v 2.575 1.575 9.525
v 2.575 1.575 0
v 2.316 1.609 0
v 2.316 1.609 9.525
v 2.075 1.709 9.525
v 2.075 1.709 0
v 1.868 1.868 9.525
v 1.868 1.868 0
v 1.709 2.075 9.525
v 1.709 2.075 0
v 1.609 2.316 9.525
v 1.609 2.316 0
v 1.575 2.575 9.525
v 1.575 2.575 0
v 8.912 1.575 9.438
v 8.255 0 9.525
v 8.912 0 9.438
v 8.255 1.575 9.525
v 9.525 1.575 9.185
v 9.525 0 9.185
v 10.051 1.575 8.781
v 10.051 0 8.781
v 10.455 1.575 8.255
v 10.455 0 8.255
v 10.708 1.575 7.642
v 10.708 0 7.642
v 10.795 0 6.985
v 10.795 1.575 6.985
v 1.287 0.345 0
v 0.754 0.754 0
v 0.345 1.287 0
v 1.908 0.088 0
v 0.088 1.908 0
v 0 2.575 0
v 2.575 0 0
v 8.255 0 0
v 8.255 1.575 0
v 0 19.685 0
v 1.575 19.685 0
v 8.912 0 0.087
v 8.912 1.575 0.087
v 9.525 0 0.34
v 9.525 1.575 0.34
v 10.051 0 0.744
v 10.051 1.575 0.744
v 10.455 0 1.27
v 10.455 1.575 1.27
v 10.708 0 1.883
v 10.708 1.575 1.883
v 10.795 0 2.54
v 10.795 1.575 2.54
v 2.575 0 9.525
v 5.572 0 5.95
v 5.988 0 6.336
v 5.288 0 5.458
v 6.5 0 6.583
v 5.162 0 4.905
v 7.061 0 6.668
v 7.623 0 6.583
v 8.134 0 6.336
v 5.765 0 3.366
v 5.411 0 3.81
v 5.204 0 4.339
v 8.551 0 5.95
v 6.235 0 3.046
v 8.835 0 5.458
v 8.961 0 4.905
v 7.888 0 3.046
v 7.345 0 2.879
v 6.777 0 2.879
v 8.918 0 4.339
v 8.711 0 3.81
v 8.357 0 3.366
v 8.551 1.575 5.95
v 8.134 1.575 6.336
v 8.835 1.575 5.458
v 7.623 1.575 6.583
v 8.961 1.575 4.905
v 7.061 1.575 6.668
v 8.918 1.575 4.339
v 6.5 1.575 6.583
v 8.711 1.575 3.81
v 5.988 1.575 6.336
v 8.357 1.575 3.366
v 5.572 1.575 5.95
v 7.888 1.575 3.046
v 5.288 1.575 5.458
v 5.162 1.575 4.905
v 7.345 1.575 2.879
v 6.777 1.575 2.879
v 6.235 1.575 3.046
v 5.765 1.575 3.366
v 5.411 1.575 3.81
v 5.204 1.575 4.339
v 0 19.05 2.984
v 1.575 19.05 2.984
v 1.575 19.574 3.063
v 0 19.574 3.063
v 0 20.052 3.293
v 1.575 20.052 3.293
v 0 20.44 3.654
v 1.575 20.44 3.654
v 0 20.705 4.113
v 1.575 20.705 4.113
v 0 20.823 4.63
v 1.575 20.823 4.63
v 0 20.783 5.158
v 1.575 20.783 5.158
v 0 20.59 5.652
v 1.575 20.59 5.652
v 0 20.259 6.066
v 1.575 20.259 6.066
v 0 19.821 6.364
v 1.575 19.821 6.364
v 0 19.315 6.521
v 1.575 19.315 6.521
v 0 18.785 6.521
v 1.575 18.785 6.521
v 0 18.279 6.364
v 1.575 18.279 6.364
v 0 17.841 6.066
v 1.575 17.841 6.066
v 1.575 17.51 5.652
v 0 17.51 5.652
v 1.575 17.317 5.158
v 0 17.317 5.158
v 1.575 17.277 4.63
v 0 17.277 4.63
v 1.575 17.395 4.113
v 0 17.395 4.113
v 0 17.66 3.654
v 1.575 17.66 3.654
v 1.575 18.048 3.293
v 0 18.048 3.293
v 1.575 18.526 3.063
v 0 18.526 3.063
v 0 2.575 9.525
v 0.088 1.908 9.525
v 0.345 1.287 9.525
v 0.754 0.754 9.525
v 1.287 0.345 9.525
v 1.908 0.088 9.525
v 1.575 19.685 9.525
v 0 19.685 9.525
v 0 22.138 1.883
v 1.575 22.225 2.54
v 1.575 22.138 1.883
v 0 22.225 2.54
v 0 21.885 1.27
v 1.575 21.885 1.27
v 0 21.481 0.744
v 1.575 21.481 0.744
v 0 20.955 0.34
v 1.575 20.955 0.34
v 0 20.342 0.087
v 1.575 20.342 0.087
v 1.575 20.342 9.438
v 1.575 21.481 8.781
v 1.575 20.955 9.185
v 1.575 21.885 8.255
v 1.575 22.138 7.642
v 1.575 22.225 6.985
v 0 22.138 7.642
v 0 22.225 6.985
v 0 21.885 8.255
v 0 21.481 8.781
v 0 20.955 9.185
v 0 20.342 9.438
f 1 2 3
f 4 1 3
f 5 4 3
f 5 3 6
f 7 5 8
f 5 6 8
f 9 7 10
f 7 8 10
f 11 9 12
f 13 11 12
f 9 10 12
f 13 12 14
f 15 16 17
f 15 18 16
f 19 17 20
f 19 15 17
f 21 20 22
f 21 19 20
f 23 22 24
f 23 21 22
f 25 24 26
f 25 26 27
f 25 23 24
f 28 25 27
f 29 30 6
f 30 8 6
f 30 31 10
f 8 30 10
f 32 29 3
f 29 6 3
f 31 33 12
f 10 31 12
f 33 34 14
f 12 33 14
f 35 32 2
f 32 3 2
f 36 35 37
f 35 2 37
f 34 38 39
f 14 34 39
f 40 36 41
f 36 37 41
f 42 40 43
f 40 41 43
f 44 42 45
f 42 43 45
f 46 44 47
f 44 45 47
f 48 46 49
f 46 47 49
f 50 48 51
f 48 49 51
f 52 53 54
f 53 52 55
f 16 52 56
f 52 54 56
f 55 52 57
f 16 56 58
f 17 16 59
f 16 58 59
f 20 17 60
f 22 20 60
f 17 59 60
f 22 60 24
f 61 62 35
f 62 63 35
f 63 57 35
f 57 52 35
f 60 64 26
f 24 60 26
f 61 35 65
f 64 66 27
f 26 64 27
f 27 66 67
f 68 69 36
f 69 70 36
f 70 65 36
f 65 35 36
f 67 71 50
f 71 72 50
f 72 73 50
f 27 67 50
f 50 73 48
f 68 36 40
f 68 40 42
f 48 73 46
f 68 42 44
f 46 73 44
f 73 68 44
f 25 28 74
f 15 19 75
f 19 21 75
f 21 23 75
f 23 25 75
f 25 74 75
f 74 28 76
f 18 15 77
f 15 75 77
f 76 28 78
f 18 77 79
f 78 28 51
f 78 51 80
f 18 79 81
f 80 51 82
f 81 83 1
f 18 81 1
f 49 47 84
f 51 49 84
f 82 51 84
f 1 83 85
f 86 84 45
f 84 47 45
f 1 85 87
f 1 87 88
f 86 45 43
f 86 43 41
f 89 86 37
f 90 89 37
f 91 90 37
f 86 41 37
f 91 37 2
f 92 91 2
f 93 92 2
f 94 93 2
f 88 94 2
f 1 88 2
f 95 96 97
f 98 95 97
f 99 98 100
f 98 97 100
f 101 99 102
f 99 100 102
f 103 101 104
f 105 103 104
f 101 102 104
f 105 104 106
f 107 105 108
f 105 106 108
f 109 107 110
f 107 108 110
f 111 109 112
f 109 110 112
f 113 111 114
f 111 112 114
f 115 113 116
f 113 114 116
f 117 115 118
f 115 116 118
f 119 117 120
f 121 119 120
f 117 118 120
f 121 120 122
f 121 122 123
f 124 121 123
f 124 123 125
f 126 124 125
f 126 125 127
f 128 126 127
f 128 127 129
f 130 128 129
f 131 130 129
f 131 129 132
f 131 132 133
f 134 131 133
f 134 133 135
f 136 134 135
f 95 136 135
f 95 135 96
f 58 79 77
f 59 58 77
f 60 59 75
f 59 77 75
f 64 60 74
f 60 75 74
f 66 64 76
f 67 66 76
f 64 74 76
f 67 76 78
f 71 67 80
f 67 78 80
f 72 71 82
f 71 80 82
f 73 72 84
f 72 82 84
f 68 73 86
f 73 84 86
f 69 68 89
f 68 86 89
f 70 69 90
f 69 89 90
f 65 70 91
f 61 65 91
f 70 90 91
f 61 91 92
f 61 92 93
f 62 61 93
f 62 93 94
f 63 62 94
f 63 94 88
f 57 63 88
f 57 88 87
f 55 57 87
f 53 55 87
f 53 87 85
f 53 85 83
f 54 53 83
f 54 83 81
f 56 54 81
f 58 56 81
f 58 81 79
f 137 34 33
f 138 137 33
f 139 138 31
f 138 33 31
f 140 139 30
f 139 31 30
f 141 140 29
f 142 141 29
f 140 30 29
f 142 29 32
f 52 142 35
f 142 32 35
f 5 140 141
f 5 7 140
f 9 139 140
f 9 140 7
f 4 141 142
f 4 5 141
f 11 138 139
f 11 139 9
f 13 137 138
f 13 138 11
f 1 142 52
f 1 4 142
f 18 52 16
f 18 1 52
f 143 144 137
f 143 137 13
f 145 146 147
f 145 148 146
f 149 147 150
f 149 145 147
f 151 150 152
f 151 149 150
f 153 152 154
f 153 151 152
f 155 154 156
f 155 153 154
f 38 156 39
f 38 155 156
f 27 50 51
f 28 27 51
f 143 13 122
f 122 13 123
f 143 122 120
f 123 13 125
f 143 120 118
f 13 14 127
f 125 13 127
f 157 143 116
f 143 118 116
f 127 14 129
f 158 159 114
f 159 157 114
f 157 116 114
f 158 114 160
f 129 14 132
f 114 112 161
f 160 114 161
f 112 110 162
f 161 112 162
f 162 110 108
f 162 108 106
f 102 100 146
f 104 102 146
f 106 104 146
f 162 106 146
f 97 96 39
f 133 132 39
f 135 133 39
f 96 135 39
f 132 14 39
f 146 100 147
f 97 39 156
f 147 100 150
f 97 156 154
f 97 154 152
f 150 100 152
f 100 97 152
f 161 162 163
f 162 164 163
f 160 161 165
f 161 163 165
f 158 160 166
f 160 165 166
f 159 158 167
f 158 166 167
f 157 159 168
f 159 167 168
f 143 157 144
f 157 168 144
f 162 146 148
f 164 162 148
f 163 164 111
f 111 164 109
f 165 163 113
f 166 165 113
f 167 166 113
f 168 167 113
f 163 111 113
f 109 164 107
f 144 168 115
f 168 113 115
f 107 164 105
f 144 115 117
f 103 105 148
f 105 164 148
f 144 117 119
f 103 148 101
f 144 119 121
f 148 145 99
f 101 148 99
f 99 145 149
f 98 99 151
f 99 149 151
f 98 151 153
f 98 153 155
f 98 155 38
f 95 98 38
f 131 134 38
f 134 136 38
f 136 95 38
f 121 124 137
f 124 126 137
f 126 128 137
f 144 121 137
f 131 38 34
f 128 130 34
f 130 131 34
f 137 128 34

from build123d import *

# Parameters (mm, degrees)
BASE_FLANGE1_DEPTH = 9.525
SKETCH6_R          = 1.905
CUT_EXTRUDE1_DEPTH = 26.173168455
SKETCH7_R          = 1.778
CUT_EXTRUDE2_DEPTH = 26.878337235
FILLET1_R          = 2.54


# Sheet-metal steps are written as plain solids
with BuildPart() as part:
    # Sketch2 → Base-Flange1 (new body)
    with BuildSketch(Plane.XY):
        with BuildLine():
            Line((0, 22.225), (0, 2.5748))
            ThreePointArc((0, 2.5748), (0.75414146, 0.75414146), (2.5748, 0))
            Line((2.5748, 0), (10.795, 0))
            Line((10.795, 0), (10.795, 1.5748))
            Line((10.795, 1.5748), (2.5748, 1.5748))
            ThreePointArc((2.5748, 1.5748), (1.867693219, 1.867693219), (1.5748, 2.5748))
            Line((1.5748, 2.5748), (1.5748, 22.225))
            Line((1.5748, 22.225), (0, 22.225))
        make_face()
    extrude(amount=BASE_FLANGE1_DEPTH)

    # Sketch6 → Cut-Extrude1 (cut, through all)
    with BuildSketch(Plane(origin=(0, 1.5748, 0), x_dir=(1, 0, 0), z_dir=(0, 1, 0))):
        with Locations(Location((7.0612, -4.7625, 0), (0, 0, 270))):
            Circle(SKETCH6_R)
    extrude(amount=-CUT_EXTRUDE1_DEPTH, mode=Mode.SUBTRACT)

    # Sketch7 → Cut-Extrude2 (cut, through all)
    with BuildSketch(Plane(origin=(1.5748, 0, 0), x_dir=(0, 0, -1), z_dir=(1, 0, 0))):
        with Locations((-4.7625, 19.05)):
            Circle(SKETCH7_R)
    extrude(amount=-CUT_EXTRUDE2_DEPTH, mode=Mode.SUBTRACT)

    # Fillet1
    fillet1_edges = [part.edges().sort_by_distance(p)[0] for p in [
        (10.795, 0.7874, 9.525),
        (0.7874, 22.225, 9.525),
        (10.795, 0.7874, 0),
        (0.7874, 22.225, 0),
    ]]
    fillet(fillet1_edges, radius=FILLET1_R)


solid = part.part
